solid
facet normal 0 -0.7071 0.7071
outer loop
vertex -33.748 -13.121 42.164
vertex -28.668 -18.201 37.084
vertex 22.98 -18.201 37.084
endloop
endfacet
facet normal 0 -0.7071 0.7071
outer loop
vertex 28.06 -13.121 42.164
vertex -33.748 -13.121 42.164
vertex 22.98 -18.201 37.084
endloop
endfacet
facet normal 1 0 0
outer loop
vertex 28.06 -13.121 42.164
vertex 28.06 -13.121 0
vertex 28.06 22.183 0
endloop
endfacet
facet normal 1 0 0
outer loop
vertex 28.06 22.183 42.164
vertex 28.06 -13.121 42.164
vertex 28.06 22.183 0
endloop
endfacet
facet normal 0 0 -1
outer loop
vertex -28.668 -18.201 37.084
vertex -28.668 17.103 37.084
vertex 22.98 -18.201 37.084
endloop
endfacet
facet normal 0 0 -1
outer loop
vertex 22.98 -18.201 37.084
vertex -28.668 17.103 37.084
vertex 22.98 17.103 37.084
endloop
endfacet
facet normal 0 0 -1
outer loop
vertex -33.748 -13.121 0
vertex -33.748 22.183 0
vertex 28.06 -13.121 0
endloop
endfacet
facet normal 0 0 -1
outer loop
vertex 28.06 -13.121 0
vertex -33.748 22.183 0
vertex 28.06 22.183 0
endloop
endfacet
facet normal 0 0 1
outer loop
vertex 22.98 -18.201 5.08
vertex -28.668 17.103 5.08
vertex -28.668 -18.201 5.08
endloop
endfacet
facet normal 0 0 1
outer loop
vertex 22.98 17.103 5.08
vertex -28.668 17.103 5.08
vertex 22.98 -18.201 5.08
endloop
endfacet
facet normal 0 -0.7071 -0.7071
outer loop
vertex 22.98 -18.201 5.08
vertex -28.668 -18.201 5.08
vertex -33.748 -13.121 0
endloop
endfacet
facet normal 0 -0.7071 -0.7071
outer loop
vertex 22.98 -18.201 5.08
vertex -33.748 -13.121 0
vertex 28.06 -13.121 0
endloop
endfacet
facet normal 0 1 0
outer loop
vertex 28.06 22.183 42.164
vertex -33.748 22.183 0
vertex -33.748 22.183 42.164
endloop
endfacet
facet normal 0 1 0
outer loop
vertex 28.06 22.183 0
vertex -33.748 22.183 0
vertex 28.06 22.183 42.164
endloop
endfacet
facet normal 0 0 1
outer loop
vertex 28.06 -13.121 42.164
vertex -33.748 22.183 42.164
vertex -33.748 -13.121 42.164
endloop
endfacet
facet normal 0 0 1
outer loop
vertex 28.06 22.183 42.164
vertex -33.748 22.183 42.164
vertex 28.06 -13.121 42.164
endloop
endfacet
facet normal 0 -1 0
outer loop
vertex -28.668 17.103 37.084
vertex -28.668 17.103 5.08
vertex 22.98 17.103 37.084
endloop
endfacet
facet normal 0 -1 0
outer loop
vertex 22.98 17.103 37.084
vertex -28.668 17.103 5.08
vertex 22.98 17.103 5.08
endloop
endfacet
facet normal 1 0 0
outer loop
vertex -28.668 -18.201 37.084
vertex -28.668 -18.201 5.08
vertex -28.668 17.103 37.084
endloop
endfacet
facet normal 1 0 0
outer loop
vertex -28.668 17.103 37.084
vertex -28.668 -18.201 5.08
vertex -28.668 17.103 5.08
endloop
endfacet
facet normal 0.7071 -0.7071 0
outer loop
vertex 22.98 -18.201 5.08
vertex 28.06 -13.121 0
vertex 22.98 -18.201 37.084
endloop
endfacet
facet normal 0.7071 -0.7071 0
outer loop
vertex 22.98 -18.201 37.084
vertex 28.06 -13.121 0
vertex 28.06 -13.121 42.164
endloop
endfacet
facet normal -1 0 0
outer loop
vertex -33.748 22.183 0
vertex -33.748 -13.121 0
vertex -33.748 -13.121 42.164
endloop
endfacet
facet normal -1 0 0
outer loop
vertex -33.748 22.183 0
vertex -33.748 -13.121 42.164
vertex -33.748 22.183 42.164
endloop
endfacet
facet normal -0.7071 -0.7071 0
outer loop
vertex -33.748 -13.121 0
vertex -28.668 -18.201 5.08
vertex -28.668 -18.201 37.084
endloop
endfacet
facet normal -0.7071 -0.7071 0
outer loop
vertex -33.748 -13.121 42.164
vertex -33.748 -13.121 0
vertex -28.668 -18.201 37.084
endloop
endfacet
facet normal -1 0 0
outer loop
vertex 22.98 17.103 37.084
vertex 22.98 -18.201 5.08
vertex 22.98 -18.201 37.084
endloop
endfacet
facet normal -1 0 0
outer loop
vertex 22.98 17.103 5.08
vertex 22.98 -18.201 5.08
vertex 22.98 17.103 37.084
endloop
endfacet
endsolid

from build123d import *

# Parameters (mm, degrees)
F0_W     = 61.8086736649
F0_H     = 40.3841938823
F1_DEPTH = 42.164
F2_T     = -5.08
F3_SIZE  = 5.07999
F4_SIZE  = 5.07999
F5_SIZE  = 5.07999


# Not quite as in the source:
# - a fillet or chamfer is up to 0.001 mm smaller than in the source, because OpenCascade refuses the exact size


with BuildPart() as f1:
    # F0 (on Top) → F1 (new body)
    with BuildSketch(Plane.XY):
        with Locations((-2.8439583257, 1.9907699898)):
            Rectangle(F0_W, F0_H)
    extrude(amount=F1_DEPTH)

    # F2
    f2_openings = [f1.faces().sort_by_distance(p)[0] for p in [
        (-2.843958, -18.201327, 21.082),
    ]]
    offset(amount=F2_T, openings=f2_openings)

    # F3 (size 5.08 in the source; OpenCascade refuses exactly that, so slightly less here)
    f3_edges = [f1.edges().sort_by_distance(p)[0] for p in [
        (-2.843958, -18.201327, 42.164),
    ]]
    chamfer(f3_edges, length=F3_SIZE)

    # F4 (size 5.08 in the source; OpenCascade refuses exactly that, so slightly less here)
    f4_edges = [f1.edges().sort_by_distance(p)[0] for p in [
        (-33.748295, -18.201327, 18.542005),
        (28.060379, -18.201327, 18.542005),
    ]]
    chamfer(f4_edges, length=F4_SIZE)

    # F5 (size 5.08 in the source; OpenCascade refuses exactly that, so slightly less here)
    f5_edges = [f1.edges().sort_by_distance(p)[0] for p in [
        (-2.843958, -18.201327, 0),
    ]]
    chamfer(f5_edges, length=F5_SIZE)


solid = f1.part
